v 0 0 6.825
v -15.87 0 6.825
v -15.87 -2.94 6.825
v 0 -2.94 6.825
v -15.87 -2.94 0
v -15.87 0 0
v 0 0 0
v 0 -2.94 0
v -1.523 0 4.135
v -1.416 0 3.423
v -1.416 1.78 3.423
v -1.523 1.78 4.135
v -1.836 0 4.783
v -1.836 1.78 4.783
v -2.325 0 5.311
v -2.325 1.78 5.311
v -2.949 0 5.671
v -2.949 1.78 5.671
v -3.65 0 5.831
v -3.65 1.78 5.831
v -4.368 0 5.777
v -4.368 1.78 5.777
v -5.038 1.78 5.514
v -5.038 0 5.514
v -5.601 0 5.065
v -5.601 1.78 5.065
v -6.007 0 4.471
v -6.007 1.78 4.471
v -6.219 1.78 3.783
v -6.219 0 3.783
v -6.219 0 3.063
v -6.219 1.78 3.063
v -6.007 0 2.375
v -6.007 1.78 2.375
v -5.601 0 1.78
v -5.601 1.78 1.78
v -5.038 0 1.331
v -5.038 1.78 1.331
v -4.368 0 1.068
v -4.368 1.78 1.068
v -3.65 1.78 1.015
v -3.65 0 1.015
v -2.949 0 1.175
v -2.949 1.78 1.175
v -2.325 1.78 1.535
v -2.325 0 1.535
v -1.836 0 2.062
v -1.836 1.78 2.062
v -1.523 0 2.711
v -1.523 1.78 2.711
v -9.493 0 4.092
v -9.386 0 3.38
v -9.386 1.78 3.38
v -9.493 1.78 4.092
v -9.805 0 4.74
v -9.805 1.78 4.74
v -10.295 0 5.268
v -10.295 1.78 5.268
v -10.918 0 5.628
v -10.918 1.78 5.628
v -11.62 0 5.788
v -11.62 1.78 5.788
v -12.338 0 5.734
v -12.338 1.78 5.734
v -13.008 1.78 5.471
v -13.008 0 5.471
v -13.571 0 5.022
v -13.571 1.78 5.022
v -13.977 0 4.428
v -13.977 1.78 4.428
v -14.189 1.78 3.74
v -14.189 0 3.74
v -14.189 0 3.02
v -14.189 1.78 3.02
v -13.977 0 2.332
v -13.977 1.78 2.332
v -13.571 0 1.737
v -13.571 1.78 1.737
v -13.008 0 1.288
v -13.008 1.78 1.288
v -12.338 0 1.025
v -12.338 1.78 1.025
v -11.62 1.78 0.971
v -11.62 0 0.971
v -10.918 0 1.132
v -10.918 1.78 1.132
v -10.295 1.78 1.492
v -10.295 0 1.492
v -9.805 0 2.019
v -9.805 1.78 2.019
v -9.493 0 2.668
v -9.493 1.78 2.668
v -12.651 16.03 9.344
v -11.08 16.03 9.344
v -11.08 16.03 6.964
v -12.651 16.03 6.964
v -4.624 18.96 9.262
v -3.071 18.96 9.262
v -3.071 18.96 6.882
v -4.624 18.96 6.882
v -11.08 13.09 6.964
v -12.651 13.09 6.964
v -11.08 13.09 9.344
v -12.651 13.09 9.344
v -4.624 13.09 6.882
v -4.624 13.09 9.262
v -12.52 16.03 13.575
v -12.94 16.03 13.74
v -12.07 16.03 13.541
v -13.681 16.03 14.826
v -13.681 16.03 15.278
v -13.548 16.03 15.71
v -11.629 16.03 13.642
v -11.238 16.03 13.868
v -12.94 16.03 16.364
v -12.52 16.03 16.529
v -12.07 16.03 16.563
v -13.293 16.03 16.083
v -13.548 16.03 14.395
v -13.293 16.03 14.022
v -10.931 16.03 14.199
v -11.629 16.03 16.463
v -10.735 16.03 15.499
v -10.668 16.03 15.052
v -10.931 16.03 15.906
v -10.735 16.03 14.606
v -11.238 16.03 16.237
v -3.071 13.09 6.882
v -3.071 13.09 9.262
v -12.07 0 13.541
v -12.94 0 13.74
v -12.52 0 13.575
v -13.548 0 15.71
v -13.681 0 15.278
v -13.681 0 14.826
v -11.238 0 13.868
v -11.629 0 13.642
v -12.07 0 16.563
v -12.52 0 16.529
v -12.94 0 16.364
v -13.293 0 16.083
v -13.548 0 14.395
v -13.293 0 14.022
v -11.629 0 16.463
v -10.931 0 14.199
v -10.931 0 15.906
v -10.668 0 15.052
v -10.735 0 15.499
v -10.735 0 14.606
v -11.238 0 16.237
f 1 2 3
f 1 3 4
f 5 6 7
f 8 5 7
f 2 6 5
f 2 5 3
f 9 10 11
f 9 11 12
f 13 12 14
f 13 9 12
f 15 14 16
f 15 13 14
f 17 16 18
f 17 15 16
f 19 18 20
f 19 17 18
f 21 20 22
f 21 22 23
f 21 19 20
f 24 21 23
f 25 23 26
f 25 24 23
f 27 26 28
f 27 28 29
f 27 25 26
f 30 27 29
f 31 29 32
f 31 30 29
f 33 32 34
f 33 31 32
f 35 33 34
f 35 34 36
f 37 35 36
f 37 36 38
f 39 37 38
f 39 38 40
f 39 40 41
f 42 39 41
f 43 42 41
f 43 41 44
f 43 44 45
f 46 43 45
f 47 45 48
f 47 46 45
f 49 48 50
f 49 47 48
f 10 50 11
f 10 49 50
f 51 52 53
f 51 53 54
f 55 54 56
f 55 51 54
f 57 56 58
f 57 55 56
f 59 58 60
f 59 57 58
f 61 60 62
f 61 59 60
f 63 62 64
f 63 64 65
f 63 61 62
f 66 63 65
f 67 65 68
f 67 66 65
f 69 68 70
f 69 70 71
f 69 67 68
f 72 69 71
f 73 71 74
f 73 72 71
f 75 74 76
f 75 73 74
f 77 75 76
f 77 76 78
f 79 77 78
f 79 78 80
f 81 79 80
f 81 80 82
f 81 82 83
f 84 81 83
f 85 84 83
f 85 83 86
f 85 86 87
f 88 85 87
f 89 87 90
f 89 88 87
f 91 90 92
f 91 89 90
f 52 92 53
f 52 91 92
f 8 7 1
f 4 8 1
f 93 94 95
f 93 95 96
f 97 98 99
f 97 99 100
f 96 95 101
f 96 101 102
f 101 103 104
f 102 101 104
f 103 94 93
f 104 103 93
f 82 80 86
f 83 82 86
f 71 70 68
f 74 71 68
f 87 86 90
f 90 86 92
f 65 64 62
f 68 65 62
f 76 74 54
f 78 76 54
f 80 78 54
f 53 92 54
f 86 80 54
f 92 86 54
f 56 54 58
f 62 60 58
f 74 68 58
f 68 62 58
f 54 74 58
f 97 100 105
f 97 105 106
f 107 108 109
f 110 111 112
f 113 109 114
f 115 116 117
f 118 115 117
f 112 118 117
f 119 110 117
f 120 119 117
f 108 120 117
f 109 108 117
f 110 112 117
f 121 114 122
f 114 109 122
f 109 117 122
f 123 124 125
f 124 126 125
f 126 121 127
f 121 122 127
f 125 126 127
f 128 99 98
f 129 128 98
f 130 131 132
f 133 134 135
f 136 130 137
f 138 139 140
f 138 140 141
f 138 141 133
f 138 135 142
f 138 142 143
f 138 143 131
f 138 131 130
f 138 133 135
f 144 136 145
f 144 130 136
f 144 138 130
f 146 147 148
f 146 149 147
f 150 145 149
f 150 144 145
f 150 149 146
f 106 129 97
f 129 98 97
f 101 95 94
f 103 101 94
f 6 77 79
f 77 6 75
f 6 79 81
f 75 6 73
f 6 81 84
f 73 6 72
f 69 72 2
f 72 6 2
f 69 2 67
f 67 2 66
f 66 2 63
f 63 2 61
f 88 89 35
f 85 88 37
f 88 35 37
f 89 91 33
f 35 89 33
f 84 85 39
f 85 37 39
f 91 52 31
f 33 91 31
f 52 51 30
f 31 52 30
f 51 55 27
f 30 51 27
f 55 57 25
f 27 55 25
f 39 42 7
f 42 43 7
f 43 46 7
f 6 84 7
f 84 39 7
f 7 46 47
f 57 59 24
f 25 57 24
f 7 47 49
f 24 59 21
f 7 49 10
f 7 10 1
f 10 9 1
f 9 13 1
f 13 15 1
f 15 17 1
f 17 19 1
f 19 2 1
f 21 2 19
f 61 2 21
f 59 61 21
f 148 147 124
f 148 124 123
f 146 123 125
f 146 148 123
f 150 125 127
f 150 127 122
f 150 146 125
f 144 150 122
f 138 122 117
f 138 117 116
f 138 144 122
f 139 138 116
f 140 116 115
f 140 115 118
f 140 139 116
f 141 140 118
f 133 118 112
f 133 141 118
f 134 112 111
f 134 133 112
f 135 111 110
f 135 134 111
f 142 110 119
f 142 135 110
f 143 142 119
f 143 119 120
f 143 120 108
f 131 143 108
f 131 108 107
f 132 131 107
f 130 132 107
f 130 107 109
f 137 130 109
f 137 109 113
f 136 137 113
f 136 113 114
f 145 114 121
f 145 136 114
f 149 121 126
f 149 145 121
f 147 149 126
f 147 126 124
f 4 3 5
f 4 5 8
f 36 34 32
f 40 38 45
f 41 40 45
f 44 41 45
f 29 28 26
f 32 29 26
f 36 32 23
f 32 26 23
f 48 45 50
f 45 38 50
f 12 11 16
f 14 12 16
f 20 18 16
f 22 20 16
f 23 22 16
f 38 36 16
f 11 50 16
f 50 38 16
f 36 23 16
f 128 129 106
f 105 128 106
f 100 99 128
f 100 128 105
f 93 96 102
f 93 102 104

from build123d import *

# Parameters (mm, degrees)
F0_W     = 15.87
F0_H     = 6.824922
F1_DEPTH = 2.94
F2_R     = 2.415
F3_DEPTH = 1.78
F4_R     = 1.515
F5_DEPTH = 16.03
F6_W     = 1.552422
F6_H     = 2.38
F7_DEPTH = 2.93
F6_W_2   = 1.570921
F8_DEPTH = 2.94


with BuildPart() as f1:
    # F0 (on Front) → F1 (new body)
    with BuildSketch(Plane.XZ):
        with Locations((-7.935, 3.412461)):
            Rectangle(F0_W, F0_H)
    extrude(amount=F1_DEPTH)

    # F2 (on Front) → F3 (join)
    with BuildSketch(Plane.XZ):
        with Locations((-11.800791, 3.379709)):
            Circle(F2_R)
        with Locations((-3.830907, 3.422793)):
            Circle(F2_R)
    extrude(amount=-F3_DEPTH)


with BuildPart() as f5:
    # F4 (on Front) → F5 (new body)
    with BuildSketch(Plane.XZ):
        with Locations((-12.182738, 15.052261)):
            Circle(F4_R)
    extrude(amount=-F5_DEPTH)


with BuildPart() as f7:
    # F6 (on face) → F7 (new body)
    with BuildSketch(Plane(origin=(0, 16.03, 0), x_dir=(-1, 0, 0), z_dir=(0, 1, 0))):
        with Locations((3.847345, 8.071937)):
            Rectangle(F6_W, F6_H)
    extrude(amount=F7_DEPTH)

    # F6 (on face) → F8 (join)
    with BuildSketch(Plane(origin=(0, 16.03, 0), x_dir=(-1, 0, 0), z_dir=(0, 1, 0))):
        with Locations((11.865937, 8.153642)):
            Rectangle(F6_W_2, F6_H)
        with Locations((3.847345, 8.071937)):
            Rectangle(F6_W, F6_H)
    extrude(amount=-F8_DEPTH)


solid = Compound([f1.part, f5.part, f7.part])
